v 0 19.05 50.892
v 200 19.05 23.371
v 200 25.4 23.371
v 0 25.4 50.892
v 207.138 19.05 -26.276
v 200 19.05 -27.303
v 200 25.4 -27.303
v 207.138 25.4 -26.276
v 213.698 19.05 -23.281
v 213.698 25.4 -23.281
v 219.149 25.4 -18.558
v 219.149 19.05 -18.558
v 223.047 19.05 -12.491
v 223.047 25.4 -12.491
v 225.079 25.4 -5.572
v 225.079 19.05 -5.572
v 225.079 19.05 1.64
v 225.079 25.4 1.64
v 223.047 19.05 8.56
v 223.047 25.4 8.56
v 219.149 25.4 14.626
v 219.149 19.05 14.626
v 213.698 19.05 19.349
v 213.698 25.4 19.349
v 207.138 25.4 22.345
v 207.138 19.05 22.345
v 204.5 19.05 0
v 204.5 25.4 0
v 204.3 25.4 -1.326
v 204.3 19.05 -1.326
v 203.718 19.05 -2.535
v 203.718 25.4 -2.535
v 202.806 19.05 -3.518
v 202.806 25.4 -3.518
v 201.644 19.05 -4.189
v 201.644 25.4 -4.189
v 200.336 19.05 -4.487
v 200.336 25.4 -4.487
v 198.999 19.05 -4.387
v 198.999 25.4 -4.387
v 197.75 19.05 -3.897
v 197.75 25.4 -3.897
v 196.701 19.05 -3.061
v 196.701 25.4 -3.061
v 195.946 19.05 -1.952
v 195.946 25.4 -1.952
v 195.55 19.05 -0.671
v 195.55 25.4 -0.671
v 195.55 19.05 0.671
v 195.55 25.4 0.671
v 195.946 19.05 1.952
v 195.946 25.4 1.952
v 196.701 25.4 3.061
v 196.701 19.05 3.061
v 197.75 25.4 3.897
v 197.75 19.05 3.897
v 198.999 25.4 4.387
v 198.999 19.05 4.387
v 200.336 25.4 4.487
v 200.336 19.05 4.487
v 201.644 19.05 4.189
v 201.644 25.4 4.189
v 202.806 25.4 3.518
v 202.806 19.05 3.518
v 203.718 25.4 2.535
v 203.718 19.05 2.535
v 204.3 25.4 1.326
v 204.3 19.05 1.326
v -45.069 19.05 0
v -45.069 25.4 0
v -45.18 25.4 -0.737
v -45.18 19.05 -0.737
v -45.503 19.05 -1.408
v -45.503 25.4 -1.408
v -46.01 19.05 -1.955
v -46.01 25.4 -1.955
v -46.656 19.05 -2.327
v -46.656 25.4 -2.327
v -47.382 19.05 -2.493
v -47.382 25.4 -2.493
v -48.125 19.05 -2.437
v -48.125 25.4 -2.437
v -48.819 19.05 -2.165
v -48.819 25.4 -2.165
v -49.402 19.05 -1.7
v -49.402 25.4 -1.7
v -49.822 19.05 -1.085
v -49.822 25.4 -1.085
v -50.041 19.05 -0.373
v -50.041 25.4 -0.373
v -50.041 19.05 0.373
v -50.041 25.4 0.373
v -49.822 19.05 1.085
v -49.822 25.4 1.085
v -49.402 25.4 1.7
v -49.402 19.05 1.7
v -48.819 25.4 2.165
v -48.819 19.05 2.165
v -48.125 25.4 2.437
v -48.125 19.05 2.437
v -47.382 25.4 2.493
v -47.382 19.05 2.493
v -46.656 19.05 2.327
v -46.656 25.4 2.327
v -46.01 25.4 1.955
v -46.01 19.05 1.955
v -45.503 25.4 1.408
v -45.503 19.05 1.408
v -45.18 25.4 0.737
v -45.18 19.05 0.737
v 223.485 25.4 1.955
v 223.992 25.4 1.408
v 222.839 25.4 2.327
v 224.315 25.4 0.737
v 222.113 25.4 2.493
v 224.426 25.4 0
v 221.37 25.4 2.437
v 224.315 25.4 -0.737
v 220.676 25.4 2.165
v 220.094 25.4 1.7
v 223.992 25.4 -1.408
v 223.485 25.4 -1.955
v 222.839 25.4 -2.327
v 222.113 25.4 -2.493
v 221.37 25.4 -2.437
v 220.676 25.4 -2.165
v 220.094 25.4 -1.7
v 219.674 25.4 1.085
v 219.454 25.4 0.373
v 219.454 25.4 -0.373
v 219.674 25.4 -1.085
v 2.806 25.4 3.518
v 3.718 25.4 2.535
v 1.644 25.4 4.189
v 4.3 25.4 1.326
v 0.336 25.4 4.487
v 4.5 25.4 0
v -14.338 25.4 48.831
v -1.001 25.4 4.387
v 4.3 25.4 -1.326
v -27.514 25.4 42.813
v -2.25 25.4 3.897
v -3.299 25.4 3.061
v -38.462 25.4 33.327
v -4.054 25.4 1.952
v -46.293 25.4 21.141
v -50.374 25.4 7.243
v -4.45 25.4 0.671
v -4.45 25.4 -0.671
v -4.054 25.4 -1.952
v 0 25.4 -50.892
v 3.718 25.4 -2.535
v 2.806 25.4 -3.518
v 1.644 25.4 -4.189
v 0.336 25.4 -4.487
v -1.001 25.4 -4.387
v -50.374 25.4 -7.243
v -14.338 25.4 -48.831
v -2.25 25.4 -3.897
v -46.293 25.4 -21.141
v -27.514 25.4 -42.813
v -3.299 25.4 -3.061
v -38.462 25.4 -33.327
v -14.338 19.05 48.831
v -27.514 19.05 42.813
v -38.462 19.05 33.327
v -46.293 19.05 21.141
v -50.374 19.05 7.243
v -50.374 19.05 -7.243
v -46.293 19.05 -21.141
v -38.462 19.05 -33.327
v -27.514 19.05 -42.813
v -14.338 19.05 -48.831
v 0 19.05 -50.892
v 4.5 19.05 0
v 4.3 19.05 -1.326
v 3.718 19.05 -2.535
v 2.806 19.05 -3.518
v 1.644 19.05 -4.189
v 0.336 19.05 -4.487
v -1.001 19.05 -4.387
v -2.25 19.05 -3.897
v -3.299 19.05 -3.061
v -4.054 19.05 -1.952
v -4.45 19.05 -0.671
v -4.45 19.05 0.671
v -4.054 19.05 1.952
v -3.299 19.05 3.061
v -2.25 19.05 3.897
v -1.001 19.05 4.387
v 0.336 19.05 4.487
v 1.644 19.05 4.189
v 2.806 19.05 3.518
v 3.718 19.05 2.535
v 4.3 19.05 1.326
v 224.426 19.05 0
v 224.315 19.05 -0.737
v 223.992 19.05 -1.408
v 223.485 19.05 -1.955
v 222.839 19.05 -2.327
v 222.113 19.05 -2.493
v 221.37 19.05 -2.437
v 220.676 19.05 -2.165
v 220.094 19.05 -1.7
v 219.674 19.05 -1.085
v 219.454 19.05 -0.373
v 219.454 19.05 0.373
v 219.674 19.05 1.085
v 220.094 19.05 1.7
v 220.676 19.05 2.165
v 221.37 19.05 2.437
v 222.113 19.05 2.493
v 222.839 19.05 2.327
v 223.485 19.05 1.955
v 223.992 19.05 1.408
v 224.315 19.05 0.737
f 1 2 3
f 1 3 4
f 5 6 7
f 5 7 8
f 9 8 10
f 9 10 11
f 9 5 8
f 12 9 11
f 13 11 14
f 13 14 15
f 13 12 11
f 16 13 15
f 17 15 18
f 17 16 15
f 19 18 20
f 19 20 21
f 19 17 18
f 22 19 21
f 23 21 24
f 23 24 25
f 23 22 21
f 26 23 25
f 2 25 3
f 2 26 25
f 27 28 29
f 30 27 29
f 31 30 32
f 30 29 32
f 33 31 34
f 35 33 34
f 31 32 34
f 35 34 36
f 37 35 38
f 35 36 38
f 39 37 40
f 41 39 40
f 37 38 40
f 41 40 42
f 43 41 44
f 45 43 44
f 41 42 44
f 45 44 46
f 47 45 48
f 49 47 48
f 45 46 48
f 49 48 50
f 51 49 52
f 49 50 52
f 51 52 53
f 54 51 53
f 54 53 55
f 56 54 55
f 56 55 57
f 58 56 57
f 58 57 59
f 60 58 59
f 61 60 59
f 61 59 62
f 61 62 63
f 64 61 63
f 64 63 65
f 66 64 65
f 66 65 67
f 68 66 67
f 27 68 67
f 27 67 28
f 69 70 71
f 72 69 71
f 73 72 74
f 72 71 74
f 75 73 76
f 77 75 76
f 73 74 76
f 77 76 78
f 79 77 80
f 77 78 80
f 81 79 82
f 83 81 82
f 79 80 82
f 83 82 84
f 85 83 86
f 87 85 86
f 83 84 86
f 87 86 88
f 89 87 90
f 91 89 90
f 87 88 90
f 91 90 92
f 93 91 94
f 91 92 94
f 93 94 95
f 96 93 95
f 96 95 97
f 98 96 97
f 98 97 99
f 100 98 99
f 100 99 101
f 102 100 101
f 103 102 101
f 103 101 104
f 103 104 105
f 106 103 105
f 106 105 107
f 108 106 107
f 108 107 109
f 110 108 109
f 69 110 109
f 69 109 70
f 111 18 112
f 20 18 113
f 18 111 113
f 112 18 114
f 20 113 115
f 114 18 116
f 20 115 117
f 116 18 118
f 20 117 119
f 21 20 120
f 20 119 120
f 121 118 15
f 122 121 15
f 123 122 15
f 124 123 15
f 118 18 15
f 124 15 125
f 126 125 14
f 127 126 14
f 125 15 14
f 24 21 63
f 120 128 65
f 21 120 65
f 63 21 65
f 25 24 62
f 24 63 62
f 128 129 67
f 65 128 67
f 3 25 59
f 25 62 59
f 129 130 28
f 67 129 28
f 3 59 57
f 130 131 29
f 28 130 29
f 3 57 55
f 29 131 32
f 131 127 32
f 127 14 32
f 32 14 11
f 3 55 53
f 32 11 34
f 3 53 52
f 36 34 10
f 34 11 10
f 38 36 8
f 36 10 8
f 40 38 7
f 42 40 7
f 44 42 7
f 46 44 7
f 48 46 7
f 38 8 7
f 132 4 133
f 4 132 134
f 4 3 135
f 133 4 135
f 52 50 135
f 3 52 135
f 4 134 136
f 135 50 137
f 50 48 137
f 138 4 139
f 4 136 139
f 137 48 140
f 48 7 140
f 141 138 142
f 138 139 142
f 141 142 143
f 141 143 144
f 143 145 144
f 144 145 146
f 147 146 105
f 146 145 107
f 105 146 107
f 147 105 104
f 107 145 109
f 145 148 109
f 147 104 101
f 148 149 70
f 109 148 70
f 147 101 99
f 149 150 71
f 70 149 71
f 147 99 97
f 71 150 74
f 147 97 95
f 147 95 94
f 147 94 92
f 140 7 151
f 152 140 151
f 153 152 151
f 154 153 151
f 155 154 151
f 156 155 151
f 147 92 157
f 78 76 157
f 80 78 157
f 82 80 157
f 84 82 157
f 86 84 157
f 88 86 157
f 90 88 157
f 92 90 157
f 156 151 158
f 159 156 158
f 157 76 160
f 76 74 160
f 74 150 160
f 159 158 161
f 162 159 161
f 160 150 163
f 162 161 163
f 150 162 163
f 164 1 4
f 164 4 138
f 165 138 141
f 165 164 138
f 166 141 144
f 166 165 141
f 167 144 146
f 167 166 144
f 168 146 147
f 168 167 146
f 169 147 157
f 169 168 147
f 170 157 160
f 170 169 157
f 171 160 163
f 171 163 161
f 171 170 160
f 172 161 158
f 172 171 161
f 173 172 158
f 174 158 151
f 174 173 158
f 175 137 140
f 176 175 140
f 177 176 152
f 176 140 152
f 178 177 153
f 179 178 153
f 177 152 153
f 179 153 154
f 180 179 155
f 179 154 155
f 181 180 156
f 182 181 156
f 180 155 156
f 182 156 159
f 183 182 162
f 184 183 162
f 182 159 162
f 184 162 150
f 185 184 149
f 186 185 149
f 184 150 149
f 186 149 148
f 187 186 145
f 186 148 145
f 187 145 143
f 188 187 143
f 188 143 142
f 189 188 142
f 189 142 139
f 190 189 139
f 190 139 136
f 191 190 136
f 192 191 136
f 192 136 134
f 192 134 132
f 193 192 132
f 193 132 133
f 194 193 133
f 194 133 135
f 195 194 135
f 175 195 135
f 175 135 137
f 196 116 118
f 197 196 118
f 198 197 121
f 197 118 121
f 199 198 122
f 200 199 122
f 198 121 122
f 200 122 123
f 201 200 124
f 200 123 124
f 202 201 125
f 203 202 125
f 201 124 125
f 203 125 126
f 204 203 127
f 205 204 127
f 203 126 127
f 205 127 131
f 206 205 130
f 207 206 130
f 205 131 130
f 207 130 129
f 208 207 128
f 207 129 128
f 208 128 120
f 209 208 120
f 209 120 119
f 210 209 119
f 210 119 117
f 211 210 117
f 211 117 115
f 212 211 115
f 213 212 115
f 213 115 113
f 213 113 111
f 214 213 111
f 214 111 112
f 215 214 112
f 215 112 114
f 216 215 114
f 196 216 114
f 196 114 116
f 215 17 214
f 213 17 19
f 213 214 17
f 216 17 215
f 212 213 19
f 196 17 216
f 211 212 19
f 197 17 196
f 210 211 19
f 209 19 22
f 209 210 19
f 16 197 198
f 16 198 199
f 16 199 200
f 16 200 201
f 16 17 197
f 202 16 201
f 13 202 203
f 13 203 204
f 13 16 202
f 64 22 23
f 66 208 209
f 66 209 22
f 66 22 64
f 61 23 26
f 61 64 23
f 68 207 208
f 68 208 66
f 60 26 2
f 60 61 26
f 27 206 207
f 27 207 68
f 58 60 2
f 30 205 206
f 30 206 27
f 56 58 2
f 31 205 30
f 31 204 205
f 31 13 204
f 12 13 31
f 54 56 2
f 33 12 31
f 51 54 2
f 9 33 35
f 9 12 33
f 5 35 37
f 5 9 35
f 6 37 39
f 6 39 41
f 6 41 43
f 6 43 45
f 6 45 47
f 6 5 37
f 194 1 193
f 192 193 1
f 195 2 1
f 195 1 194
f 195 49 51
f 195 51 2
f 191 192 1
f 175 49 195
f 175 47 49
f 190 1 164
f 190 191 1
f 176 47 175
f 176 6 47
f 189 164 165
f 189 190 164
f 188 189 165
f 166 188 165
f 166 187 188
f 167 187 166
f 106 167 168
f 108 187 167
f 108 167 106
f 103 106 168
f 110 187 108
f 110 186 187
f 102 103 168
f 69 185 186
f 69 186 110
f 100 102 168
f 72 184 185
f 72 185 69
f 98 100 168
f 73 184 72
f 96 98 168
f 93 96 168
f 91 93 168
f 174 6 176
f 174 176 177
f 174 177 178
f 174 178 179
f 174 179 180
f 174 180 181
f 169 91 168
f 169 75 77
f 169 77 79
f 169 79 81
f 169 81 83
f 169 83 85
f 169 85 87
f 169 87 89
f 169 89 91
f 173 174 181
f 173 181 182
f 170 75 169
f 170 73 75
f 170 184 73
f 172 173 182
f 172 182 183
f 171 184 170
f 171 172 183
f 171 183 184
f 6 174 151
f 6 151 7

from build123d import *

# Parameters (mm, degrees)
BOSS_EXTRUDE1_DEPTH = 25.4
SKETCH3_R           = 2.5
CUT_EXTRUDE2_DEPTH  = 25.4
CUT_EXTRUDE3_DEPTH  = 19.05
SKETCH4_R           = 4.5
CUT_EXTRUDE4_DEPTH  = 19.05


with BuildPart() as part:
    # Sketch1 → Boss-Extrude1 (new body)
    with BuildSketch(Plane(origin=(0, 0, 0), x_dir=(1, 0, 0), z_dir=(0, 1, 0))):
        with BuildLine():
            Line((0, 50.892363224), (200.000108, 27.30276997))
            ThreePointArc((200.000108, 27.30276997), (225.337078532, 1.965799438), (200.000108, -23.371171094))
            Line((200.000108, -23.371171094), (0, -50.892363224))
            ThreePointArc((0, -50.892363224), (-50.892363224, 0), (0, 50.892363224))
        make_face()
    extrude(amount=BOSS_EXTRUDE1_DEPTH)

    # Sketch3 → Cut-Extrude2 (cut)
    with BuildSketch(Plane(origin=(0, 25.4, 0), x_dir=(1, 0, 0), z_dir=(0, 1, 0))):
        with Locations((-47.56908022, 0)):
            Circle(SKETCH3_R)
        with Locations((221.926143204, 0)):
            Circle(SKETCH3_R)
    extrude(amount=-CUT_EXTRUDE2_DEPTH, mode=Mode.SUBTRACT)

    # Sketch1<3> → Cut-Extrude3 (cut)
    with BuildSketch(Plane(origin=(0, 0, 0), x_dir=(1, 0, 0), z_dir=(0, 1, 0))):
        with BuildLine():
            Line((0, 50.892363224), (200.000108, 27.30276997))
            ThreePointArc((200.000108, 27.30276997), (225.337078532, 1.965799438), (200.000108, -23.371171094))
            Line((200.000108, -23.371171094), (0, -50.892363224))
            ThreePointArc((0, -50.892363224), (-50.892363224, 0), (0, 50.892363224))
        make_face()
    extrude(amount=CUT_EXTRUDE3_DEPTH, mode=Mode.SUBTRACT)

    # Sketch4 → Cut-Extrude4 (cut)
    with BuildSketch(Plane(origin=(0, 25.4, 0), x_dir=(1, 0, 0), z_dir=(0, 1, 0))):
        Circle(SKETCH4_R)
        with Locations((200.000108, 0)):
            Circle(SKETCH4_R)
    extrude(amount=-CUT_EXTRUDE4_DEPTH, mode=Mode.SUBTRACT)


solid = part.part
